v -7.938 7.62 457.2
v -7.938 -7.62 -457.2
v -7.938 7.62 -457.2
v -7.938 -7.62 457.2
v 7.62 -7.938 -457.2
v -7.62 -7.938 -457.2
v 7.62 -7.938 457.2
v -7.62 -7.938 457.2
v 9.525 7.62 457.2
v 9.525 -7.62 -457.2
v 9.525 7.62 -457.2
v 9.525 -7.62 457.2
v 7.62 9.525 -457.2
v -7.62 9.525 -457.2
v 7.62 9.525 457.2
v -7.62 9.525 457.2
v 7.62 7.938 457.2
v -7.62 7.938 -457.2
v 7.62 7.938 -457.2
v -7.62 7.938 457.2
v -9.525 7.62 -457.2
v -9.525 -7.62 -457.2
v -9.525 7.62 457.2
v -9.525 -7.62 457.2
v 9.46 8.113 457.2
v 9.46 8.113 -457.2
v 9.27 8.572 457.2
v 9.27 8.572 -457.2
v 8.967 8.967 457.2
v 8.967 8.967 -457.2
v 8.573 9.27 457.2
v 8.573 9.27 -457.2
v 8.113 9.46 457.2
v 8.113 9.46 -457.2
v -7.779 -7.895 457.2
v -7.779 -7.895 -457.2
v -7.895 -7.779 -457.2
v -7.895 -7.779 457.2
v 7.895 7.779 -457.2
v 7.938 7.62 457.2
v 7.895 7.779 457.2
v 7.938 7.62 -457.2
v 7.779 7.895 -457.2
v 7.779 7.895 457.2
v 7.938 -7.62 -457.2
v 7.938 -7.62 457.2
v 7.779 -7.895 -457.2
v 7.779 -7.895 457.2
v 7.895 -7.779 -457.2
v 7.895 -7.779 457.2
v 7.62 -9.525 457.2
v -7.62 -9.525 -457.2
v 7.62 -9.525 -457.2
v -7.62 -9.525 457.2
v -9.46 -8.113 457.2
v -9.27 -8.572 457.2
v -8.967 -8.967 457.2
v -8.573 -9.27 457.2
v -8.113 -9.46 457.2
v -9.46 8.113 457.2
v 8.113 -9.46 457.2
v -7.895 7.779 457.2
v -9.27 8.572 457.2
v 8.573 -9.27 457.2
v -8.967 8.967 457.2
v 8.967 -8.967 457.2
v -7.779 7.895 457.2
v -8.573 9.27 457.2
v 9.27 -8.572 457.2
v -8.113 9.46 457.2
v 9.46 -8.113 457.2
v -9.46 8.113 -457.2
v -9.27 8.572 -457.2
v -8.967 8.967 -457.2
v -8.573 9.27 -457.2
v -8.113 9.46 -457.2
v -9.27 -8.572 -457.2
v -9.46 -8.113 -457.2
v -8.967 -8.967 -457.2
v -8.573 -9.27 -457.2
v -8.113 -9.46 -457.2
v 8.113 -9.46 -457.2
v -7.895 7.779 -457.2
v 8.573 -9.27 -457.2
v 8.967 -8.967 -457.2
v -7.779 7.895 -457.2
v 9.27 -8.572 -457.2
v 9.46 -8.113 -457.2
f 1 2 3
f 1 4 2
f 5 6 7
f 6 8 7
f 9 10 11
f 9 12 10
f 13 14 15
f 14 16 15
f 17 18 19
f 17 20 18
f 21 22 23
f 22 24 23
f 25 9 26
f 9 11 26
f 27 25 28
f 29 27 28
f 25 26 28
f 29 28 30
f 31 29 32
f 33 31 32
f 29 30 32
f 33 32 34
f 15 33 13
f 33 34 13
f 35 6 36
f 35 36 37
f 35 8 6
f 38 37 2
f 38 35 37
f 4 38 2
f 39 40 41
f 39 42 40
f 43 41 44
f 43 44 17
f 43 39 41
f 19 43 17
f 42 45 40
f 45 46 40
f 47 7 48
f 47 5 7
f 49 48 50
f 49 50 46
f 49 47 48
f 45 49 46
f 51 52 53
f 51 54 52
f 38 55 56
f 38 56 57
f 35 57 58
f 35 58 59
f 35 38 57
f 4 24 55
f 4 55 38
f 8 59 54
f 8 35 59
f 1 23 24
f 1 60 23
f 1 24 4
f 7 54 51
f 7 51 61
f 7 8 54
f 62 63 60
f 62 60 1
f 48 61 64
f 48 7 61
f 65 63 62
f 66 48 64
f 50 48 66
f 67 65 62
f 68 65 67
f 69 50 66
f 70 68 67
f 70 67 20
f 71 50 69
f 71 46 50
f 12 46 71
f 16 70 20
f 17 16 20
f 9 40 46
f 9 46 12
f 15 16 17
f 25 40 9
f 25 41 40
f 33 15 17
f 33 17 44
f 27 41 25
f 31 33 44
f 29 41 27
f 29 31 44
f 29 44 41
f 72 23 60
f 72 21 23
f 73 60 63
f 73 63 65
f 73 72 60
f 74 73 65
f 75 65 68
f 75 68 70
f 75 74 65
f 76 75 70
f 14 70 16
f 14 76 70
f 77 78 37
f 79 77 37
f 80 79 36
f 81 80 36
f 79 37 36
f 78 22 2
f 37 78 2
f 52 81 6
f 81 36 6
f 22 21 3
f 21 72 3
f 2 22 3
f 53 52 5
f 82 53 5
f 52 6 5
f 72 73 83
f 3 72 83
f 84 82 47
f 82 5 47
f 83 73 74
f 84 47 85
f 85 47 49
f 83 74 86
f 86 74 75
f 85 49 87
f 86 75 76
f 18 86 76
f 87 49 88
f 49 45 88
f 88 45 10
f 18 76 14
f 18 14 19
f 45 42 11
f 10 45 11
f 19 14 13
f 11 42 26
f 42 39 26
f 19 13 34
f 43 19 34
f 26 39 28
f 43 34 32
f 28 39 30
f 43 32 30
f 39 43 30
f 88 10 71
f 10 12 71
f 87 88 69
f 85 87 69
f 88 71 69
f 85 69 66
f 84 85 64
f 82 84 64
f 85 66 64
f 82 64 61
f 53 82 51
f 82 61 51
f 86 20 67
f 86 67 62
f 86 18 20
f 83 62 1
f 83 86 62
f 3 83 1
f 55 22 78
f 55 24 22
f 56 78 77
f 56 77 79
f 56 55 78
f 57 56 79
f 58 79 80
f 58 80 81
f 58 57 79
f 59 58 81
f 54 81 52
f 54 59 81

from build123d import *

# Parameters (mm, degrees)
SKETCH2_W           = 19.05
SKETCH2_H           = 19.05
SKETCH2_W_2         = 15.875
SKETCH2_H_2         = 15.875
BOSS_EXTRUDE1_DEPTH = 457.2
FILLET1_R           = 1.905
FILLET2_R           = 0.3175


with BuildPart() as part:
    # Sketch2 → Boss-Extrude1 (new, symmetric)
    with BuildSketch(Plane.XY):
        Rectangle(SKETCH2_W, SKETCH2_H)
        Rectangle(SKETCH2_W_2, SKETCH2_H_2, mode=Mode.SUBTRACT)
    extrude(amount=BOSS_EXTRUDE1_DEPTH, both=True)

    # Fillet1
    fillet1_edges = [part.edges().sort_by_distance(p)[0] for p in [
        (-9.525, -9.525, 0),
        (-9.525, 9.525, 0),
        (9.525, 9.525, 0),
        (9.525, -9.525, 0),
    ]]
    fillet(fillet1_edges, radius=FILLET1_R)

    # Fillet2
    fillet2_edges = [part.edges().sort_by_distance(p)[0] for p in [
        (-7.9375, -7.9375, 0),
        (7.9375, -7.9375, 0),
        (7.9375, 7.9375, 0),
        (-7.9375, 7.9375, 0),
    ]]
    fillet(fillet2_edges, radius=FILLET2_R)


solid = part.part
